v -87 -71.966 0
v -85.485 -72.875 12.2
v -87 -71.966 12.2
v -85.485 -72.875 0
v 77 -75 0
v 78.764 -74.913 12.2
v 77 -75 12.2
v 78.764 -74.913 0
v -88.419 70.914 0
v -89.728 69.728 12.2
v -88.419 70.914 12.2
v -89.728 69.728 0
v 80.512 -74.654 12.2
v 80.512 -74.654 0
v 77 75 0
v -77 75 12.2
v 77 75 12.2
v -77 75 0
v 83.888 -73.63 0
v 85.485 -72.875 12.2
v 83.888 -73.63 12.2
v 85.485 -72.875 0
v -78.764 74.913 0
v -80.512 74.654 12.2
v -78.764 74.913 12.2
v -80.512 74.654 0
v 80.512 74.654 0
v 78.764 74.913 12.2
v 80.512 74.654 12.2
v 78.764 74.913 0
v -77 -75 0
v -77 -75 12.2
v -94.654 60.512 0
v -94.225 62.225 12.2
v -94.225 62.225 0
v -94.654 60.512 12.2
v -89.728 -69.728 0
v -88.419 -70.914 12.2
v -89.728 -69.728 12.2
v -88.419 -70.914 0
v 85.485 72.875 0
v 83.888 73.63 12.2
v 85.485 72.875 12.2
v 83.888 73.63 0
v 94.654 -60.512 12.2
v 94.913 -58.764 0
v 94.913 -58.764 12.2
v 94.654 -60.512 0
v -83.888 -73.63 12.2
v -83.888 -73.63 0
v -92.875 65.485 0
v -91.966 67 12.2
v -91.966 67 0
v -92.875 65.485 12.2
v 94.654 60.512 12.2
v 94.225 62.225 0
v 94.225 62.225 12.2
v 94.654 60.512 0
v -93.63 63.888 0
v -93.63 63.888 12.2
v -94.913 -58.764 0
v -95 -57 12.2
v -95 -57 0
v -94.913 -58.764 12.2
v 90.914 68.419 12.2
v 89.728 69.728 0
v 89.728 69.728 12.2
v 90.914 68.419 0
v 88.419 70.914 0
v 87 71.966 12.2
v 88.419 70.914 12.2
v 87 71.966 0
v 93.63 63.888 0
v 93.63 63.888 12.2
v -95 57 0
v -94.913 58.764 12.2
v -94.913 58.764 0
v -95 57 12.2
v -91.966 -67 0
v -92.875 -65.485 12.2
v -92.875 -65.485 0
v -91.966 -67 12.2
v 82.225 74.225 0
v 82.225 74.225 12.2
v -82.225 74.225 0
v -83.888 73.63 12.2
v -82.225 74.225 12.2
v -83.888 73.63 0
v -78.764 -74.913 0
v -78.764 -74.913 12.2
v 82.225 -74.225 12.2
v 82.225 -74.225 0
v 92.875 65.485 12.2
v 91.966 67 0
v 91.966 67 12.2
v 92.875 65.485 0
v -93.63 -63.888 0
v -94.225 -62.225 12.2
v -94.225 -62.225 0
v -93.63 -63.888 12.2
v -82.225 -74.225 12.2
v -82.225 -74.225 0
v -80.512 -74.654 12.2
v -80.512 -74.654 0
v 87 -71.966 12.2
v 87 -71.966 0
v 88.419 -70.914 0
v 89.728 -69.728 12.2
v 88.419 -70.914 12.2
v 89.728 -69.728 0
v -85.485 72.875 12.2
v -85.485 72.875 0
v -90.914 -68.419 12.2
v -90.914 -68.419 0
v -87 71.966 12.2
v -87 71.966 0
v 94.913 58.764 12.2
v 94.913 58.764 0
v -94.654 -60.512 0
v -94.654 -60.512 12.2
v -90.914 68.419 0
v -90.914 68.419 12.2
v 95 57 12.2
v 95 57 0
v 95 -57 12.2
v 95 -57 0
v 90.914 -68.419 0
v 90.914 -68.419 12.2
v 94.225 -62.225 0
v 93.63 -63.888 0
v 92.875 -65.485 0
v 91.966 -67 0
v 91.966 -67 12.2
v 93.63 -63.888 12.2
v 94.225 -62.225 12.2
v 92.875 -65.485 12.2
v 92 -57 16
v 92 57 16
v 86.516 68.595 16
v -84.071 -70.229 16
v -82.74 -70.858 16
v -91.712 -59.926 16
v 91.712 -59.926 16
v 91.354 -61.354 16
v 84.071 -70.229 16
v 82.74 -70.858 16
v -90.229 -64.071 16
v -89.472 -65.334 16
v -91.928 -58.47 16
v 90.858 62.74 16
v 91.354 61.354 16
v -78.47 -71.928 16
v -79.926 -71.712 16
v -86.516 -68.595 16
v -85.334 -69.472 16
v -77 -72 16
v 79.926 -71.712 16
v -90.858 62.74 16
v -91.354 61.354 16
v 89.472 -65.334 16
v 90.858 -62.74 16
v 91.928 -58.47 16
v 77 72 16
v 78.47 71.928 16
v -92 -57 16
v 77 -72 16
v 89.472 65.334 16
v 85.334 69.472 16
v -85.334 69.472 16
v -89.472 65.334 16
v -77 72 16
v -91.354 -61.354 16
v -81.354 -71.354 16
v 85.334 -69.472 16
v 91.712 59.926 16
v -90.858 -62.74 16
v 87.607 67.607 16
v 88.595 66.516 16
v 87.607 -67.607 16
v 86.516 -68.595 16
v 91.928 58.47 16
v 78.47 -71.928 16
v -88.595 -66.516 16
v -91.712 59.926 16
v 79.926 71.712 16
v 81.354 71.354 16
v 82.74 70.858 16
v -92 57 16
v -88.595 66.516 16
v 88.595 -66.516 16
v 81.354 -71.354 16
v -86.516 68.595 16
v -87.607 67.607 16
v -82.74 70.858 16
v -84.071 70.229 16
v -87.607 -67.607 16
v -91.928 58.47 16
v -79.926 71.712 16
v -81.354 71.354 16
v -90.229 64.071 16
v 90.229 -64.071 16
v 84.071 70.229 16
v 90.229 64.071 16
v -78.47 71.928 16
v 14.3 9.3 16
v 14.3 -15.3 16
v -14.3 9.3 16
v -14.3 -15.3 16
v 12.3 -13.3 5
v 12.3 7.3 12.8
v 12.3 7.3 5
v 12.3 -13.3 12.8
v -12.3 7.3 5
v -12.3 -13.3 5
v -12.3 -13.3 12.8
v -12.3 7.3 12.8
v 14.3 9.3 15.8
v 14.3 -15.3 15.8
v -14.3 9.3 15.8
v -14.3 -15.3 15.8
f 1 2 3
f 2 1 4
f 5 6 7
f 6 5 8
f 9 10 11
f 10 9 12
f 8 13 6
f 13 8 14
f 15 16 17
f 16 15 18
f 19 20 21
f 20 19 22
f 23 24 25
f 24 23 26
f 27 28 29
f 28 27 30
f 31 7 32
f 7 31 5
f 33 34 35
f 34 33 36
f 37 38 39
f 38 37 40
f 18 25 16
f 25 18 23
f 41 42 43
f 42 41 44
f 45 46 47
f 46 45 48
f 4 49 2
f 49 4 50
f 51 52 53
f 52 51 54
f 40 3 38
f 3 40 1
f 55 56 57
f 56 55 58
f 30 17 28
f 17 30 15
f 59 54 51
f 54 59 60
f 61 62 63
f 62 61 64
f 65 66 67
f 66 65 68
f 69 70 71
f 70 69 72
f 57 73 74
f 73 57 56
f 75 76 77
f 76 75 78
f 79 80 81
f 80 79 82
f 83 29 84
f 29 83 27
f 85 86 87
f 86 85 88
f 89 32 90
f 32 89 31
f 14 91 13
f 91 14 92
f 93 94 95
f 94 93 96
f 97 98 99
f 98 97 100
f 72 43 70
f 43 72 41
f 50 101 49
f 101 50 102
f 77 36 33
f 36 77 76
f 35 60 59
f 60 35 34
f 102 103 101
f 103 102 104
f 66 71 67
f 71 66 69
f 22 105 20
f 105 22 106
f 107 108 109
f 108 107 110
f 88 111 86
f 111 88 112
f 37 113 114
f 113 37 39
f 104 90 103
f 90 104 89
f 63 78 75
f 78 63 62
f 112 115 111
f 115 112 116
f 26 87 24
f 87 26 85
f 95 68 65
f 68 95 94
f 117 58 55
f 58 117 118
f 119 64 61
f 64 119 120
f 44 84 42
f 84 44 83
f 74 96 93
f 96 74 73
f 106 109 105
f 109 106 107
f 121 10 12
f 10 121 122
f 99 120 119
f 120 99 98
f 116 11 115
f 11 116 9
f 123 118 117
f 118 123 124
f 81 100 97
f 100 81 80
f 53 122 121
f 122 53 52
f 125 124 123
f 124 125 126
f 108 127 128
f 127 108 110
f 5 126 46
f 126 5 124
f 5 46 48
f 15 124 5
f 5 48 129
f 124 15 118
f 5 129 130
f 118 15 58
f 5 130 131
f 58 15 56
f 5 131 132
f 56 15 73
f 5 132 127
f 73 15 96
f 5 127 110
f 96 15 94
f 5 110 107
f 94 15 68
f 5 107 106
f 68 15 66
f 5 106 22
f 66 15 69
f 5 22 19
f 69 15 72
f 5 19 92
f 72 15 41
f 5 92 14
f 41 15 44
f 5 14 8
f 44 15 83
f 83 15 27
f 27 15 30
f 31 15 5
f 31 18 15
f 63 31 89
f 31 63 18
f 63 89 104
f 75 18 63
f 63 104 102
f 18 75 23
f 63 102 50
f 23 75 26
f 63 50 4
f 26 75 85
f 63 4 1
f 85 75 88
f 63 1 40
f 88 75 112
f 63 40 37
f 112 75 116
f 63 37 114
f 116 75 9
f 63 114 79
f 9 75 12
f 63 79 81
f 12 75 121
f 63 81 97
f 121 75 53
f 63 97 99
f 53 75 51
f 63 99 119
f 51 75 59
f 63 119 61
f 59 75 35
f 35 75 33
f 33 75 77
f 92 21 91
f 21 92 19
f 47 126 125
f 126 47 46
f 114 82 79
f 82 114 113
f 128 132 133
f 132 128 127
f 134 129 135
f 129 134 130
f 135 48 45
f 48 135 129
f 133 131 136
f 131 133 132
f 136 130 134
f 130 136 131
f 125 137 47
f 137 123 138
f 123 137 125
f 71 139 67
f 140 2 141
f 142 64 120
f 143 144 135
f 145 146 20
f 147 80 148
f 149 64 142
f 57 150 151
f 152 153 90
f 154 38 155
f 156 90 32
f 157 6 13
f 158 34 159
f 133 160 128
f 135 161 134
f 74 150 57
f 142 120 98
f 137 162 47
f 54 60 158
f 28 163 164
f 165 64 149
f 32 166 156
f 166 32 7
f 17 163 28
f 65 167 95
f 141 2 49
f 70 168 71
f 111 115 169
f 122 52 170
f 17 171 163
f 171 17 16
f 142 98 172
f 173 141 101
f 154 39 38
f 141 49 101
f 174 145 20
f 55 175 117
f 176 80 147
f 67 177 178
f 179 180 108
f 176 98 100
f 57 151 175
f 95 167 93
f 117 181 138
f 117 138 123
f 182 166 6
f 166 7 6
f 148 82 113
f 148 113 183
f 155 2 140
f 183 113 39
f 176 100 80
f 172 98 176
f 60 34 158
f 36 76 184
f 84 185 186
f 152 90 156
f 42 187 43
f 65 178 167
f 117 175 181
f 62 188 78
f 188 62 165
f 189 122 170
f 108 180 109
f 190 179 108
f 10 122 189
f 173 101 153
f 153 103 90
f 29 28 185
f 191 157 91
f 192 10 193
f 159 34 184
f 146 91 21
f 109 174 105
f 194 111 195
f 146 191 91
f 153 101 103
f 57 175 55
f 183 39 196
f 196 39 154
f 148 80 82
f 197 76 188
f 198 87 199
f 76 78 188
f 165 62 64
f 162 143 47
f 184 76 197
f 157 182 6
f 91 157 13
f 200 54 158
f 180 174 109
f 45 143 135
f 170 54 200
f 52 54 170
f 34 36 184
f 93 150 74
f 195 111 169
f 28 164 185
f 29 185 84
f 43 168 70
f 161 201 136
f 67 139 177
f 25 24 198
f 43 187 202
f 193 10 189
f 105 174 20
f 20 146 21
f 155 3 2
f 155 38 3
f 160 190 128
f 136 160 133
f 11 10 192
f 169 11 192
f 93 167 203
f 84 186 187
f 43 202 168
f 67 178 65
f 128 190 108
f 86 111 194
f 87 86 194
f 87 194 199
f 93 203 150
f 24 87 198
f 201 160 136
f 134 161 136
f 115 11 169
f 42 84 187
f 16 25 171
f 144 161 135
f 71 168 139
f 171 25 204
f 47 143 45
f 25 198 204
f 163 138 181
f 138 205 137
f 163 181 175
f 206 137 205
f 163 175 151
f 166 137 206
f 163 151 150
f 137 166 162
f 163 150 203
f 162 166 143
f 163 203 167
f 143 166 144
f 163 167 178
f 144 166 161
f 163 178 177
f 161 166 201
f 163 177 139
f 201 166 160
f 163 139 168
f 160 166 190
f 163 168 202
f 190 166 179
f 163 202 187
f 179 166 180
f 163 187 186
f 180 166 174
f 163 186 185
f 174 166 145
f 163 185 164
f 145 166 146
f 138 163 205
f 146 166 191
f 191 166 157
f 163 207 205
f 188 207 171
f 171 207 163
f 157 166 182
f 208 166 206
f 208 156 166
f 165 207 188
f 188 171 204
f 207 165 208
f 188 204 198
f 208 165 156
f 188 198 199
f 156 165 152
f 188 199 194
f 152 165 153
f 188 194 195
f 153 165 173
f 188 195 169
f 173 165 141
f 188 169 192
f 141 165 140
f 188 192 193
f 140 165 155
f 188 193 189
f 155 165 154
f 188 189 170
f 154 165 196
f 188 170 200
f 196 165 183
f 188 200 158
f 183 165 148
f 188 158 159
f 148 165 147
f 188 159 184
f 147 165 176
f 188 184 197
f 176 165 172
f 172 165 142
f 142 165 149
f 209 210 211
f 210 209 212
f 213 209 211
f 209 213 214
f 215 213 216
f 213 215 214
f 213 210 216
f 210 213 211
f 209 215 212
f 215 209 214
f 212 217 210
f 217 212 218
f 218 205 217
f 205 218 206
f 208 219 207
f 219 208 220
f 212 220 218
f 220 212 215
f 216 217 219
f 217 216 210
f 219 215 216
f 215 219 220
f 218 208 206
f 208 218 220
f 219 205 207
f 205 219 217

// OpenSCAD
// Headphone stand in three parts: base, post, hanger.
// No glue, no screws. Rectangular tenon/socket press/clearance fits;
// rectangular sections stop the hanger spinning on the post.
// Print orientations:
//   base   - flat on the bed, socket up
//   post   - lying on its back face, long axis along X
//   hanger - lying on one side face, saddle profile in the X/Y plane
// Assembled top of hanger is 270 mm above the desk.

part = "base"; // [base, post, hanger, assembly]
cadverify_only = "";

$fn = 64;

/* Dimensions (mm) */
base_w = 190;
base_d = 150;
base_t = 16;
base_r = 18;

desk_to_hanger_top = 270;

post_len_print = 241;       // use z 7..248
hanger_len = 124;           // use/print x -62..62
hanger_width = 36;          // use y -18..18
hanger_h_print = 38;        // use z 232..270 at centre

/* Socket / tenon geometry (use coordinates, for reference)
   Post main section:  x -16..16, y -13..13
   Bottom tenon:       x -12..12, y -13..7,  z 7..16   (base socket z 6..16)
   Top tenon:          x -12..12, y -13..3,  z 232..248 (hanger socket from z 232)
   Sockets are tenon size + 0.3 mm clearance per side, with flared mouths.
*/

module instance(name, part_name, unit = 1) {
    echo(cadverify_instance = [name, part_name, unit]);
    if (cadverify_only == "" || cadverify_only == name) children();
}

module box3(x0, x1, y0, y1, z0, z1) {
    translate([x0, y0, z0]) cube([x1 - x0, y1 - y0, z1 - z0]);
}

module rounded_rect(w, d, r) {
    offset(r = r) square([w - 2 * r, d - 2 * r], center = true);
}

/* ---------------- BASE (print = use orientation) ---------------- */
module base_part() {
    difference() {
        union() {
            linear_extrude(12) rounded_rect(base_w, base_d, base_r);
            // 45-ish top edge taper: inset 3 mm over 4 mm height
            hull() {
                translate([0, 0, 12]) linear_extrude(0.2)
                    rounded_rect(base_w, base_d, base_r);
                translate([0, 0, base_t - 0.2]) linear_extrude(0.2)
                    rounded_rect(base_w - 6, base_d - 6, base_r - 3);
            }
        }
        // socket for post bottom tenon: 24.6 x 20.6, centre y=-3, floor z=6
        box3(-12.3, 12.3, -13.3, 7.3, 5, 17);
        // flared socket mouth (entry chamfer), 28.6 x 24.6 at the top face
        hull() {
            translate([0, -3, 15.9]) cube([28.6, 24.6, 0.2], center = true);
            translate([0, -3, 12.9]) cube([24.6, 20.6, 0.2], center = true);
        }
    }
}

/* ---------------- POST (print orientation) ----------------
   Print axes: X = use Z (length, 0 at bottom-tenon tip), Y = use X, Z = use Y + 13.
   Every section reaches Z=0 (the use back face), so it lies flat on the bed. */
module post_part() {
    union() {
        // bottom tenon, tapered lead-in in plan, 24 wide x 20 deep
        linear_extrude(20)
            polygon([[0, -9], [3, -12], [9, -12], [9, 12], [3, 12], [0, 9]]);
        // main shaft 32 x 26
        box3(9, 225, -16, 16, 0, 26);
        // bottom collar 52 wide, sits on the base top
        box3(9, 19, -26, 26, 0, 26);
        // top collar 48 wide, supports the hanger underside
        box3(217, 225, -24, 24, 0, 26);
        // top tenon, tapered lead-in in plan, 24 wide x 16 deep
        linear_extrude(16)
            polygon([[225, -12], [238, -12], [241, -9], [241, 9], [238, 12], [225, 12]]);
    }
}

/* ---------------- HANGER (print orientation) ----------------
   Print axes: X = use X, Y = use Z - 232, Z = use Y side face (0 on the bed).
   The saddle profile (parabolic top and bottom) is extruded across the width. */
module hanger_profile() {
    top = [for (i = [0 : 20]) let (x = -62 + 124 * i / 20)
        [x, hanger_h_print - 14 * pow(x / 62, 2)]];
    bot = [for (i = [20 : -1 : 0]) let (x = -62 + 124 * i / 20)
        [x, 12 * pow(x / 62, 2)]];
    polygon(concat(top, bot));
}

// Prismatic cutter in the Y/Z plane, extruded along X from -75 to 75.
// yz points are [y, z]; the region is the polygon given.
module cutter_yz(yz) {
    pts = [for (p = yz) [-p[1], p[0]]];   // local x = -z, local y = y
    translate([-75, 0, 0]) rotate([0, 90, 0]) linear_extrude(150) polygon(pts);
}

module hanger_part() {
    difference() {
        // saddle body: profile extruded 36 across
        linear_extrude(hanger_width) hanger_profile();
        // rounded (chamfered) longitudinal edges of the saddle top:
        // in print these cut the Y=profile-top / Z=0 and Z=36 corners.
        cutter_yz([[32, 36], [44, 30], [44, 52], [32, 52]]);   // Z=36 side
        cutter_yz([[32, -12], [44, -12], [44, 12], [32, 0]]);  // Z=0 side
        // socket for post top tenon: x -12.3..12.3, print z 14.7..31.3, depth to y=18
        box3(-12.3, 12.3, -2, 18, 14.7, 31.3);
        // flared socket mouth at the underside (print y = 0 face of the pocket)
        hull() {
            box3(-14.3, 14.3, -1.0, -0.8, 12.7, 33.3);
            box3(-12.3, 12.3, 5.0, 5.2, 14.7, 31.3);
        }
    }
}

/* ---------------- VERIFIABLE SPECS ---------------- */
if (part == "base") {
    echo(cadverify_spec = [
        ["bounds", [[-base_w/2, -base_d/2, 0], [base_w/2, base_d/2, base_t]]],
        ["bodies", 1],
        ["through_holes", 0],
        ["support_faces", [["bottom", "-z", 20000]]],
        ["overhangs_allowed", []],
        ["copies", 1],
        ["details", [
            ["base_plate", "material", [[-80, -60, 1], [80, 60, 5]], 0.95],
            ["socket", "void", [[-11, -12, 10], [11, 6, 16.5]], 0.95],
            ["socket_mouth_flare", "void", [[-13, -14, 15], [13, 8, 17]], 0.90],
            ["socket_floor", "thickness", [0, -3, 20], [0, 0, -1], 6],
            ["base_plate_thickness", "thickness", [60, 40, 20], [0, 0, -1], 16],
            ["top_edge_taper", "view", [[70, -20, 11], [96, 20, 17]]]
        ]]
    ]);
} else if (part == "post") {
    echo(cadverify_spec = [
        ["bounds", [[0, -26, 0], [post_len_print, 26, 26]]],
        ["bodies", 1],
        ["through_holes", 0],
        ["support_faces", [["back", "-z", 6000]]],
        ["overhangs_allowed", []],
        ["copies", 1],
        ["details", [
            ["main_shaft", "material", [[50, -14, 2], [100, 14, 24]], 0.95],
            ["bottom_collar", "material", [[10, -25, 2], [18, 25, 24]], 0.90],
            ["top_collar", "material", [[218, -23, 2], [224, 23, 24]], 0.90],
            ["beside_bottom_tenon", "void", [[1, 14, 2], [8, 20, 24]], 0.95],
            ["beside_top_tenon", "void", [[226, 14, 18], [240, 20, 24]], 0.95],
            ["shaft_depth", "thickness", [50, 0, -5], [0, 0, 1], 26],
            ["shaft_width", "thickness", [50, -30, 13], [0, 1, 0], 32],
            ["top_tenon", "view", [[215, -15, 0], [242, 15, 20]]]
        ]]
    ]);
} else if (part == "hanger") {
    echo(cadverify_spec = [
        ["bounds", [[-hanger_len/2, 0, 0], [hanger_len/2, hanger_h_print, hanger_width]]],
        ["bodies", 1],
        ["through_holes", 0],
        ["support_faces", [["side", "-z", 3000]]],
        ["overhangs_allowed", []],
        ["copies", 1],
        ["details", [
            ["saddle_centre", "material", [[-20, 28, 8], [20, 36, 28]], 0.90],
            ["socket", "void", [[-11, 2, 16], [11, 16, 30]], 0.95],
            ["material_above_socket", "thickness", [0, 45, 23], [0, -1, 0], 20],
            ["saddle_width", "thickness", [0, 20, -5], [0, 0, 1], 36],
            ["saddle_top_edge", "view", [[-25, 30, 28], [25, 39, 37]]]
        ]]
    ]);
} else if (part == "assembly") {
    echo(cadverify_spec = [
        ["bounds", [[-base_w/2, -base_d/2, 0], [base_w/2, base_d/2, desk_to_hanger_top]]],
        ["support_faces", [["desk", "-z", 20000]]],
        ["allowed_interferences", []],
        ["assembly_order", [
            [["base"], [0, 0, 0]],
            [["post"], [0, 0, -1]],
            [["hanger"], [0, 0, -1]]
        ]]
    ]);
}

/* ---------------- OUTPUT ---------------- */
if (part == "base") {
    base_part();
} else if (part == "post") {
    post_part();
} else if (part == "hanger") {
    hanger_part();
} else if (part == "assembly") {
    instance("base", "base") base_part();
    // print -> use: Xu=Yp, Yu=Zp-13, Zu=Xp+7
    instance("post", "post")
        multmatrix([[0, 1, 0, 0],
                    [0, 0, 1, -13],
                    [1, 0, 0, 7],
                    [0, 0, 0, 1]]) post_part();
    // print -> use: Xu=Xp, Yu=-Zp+18, Zu=Yp+232
    instance("hanger", "hanger")
        multmatrix([[1, 0, 0, 0],
                    [0, 0, -1, 18],
                    [0, 1, 0, 232],
                    [0, 0, 0, 1]]) hanger_part();
}
